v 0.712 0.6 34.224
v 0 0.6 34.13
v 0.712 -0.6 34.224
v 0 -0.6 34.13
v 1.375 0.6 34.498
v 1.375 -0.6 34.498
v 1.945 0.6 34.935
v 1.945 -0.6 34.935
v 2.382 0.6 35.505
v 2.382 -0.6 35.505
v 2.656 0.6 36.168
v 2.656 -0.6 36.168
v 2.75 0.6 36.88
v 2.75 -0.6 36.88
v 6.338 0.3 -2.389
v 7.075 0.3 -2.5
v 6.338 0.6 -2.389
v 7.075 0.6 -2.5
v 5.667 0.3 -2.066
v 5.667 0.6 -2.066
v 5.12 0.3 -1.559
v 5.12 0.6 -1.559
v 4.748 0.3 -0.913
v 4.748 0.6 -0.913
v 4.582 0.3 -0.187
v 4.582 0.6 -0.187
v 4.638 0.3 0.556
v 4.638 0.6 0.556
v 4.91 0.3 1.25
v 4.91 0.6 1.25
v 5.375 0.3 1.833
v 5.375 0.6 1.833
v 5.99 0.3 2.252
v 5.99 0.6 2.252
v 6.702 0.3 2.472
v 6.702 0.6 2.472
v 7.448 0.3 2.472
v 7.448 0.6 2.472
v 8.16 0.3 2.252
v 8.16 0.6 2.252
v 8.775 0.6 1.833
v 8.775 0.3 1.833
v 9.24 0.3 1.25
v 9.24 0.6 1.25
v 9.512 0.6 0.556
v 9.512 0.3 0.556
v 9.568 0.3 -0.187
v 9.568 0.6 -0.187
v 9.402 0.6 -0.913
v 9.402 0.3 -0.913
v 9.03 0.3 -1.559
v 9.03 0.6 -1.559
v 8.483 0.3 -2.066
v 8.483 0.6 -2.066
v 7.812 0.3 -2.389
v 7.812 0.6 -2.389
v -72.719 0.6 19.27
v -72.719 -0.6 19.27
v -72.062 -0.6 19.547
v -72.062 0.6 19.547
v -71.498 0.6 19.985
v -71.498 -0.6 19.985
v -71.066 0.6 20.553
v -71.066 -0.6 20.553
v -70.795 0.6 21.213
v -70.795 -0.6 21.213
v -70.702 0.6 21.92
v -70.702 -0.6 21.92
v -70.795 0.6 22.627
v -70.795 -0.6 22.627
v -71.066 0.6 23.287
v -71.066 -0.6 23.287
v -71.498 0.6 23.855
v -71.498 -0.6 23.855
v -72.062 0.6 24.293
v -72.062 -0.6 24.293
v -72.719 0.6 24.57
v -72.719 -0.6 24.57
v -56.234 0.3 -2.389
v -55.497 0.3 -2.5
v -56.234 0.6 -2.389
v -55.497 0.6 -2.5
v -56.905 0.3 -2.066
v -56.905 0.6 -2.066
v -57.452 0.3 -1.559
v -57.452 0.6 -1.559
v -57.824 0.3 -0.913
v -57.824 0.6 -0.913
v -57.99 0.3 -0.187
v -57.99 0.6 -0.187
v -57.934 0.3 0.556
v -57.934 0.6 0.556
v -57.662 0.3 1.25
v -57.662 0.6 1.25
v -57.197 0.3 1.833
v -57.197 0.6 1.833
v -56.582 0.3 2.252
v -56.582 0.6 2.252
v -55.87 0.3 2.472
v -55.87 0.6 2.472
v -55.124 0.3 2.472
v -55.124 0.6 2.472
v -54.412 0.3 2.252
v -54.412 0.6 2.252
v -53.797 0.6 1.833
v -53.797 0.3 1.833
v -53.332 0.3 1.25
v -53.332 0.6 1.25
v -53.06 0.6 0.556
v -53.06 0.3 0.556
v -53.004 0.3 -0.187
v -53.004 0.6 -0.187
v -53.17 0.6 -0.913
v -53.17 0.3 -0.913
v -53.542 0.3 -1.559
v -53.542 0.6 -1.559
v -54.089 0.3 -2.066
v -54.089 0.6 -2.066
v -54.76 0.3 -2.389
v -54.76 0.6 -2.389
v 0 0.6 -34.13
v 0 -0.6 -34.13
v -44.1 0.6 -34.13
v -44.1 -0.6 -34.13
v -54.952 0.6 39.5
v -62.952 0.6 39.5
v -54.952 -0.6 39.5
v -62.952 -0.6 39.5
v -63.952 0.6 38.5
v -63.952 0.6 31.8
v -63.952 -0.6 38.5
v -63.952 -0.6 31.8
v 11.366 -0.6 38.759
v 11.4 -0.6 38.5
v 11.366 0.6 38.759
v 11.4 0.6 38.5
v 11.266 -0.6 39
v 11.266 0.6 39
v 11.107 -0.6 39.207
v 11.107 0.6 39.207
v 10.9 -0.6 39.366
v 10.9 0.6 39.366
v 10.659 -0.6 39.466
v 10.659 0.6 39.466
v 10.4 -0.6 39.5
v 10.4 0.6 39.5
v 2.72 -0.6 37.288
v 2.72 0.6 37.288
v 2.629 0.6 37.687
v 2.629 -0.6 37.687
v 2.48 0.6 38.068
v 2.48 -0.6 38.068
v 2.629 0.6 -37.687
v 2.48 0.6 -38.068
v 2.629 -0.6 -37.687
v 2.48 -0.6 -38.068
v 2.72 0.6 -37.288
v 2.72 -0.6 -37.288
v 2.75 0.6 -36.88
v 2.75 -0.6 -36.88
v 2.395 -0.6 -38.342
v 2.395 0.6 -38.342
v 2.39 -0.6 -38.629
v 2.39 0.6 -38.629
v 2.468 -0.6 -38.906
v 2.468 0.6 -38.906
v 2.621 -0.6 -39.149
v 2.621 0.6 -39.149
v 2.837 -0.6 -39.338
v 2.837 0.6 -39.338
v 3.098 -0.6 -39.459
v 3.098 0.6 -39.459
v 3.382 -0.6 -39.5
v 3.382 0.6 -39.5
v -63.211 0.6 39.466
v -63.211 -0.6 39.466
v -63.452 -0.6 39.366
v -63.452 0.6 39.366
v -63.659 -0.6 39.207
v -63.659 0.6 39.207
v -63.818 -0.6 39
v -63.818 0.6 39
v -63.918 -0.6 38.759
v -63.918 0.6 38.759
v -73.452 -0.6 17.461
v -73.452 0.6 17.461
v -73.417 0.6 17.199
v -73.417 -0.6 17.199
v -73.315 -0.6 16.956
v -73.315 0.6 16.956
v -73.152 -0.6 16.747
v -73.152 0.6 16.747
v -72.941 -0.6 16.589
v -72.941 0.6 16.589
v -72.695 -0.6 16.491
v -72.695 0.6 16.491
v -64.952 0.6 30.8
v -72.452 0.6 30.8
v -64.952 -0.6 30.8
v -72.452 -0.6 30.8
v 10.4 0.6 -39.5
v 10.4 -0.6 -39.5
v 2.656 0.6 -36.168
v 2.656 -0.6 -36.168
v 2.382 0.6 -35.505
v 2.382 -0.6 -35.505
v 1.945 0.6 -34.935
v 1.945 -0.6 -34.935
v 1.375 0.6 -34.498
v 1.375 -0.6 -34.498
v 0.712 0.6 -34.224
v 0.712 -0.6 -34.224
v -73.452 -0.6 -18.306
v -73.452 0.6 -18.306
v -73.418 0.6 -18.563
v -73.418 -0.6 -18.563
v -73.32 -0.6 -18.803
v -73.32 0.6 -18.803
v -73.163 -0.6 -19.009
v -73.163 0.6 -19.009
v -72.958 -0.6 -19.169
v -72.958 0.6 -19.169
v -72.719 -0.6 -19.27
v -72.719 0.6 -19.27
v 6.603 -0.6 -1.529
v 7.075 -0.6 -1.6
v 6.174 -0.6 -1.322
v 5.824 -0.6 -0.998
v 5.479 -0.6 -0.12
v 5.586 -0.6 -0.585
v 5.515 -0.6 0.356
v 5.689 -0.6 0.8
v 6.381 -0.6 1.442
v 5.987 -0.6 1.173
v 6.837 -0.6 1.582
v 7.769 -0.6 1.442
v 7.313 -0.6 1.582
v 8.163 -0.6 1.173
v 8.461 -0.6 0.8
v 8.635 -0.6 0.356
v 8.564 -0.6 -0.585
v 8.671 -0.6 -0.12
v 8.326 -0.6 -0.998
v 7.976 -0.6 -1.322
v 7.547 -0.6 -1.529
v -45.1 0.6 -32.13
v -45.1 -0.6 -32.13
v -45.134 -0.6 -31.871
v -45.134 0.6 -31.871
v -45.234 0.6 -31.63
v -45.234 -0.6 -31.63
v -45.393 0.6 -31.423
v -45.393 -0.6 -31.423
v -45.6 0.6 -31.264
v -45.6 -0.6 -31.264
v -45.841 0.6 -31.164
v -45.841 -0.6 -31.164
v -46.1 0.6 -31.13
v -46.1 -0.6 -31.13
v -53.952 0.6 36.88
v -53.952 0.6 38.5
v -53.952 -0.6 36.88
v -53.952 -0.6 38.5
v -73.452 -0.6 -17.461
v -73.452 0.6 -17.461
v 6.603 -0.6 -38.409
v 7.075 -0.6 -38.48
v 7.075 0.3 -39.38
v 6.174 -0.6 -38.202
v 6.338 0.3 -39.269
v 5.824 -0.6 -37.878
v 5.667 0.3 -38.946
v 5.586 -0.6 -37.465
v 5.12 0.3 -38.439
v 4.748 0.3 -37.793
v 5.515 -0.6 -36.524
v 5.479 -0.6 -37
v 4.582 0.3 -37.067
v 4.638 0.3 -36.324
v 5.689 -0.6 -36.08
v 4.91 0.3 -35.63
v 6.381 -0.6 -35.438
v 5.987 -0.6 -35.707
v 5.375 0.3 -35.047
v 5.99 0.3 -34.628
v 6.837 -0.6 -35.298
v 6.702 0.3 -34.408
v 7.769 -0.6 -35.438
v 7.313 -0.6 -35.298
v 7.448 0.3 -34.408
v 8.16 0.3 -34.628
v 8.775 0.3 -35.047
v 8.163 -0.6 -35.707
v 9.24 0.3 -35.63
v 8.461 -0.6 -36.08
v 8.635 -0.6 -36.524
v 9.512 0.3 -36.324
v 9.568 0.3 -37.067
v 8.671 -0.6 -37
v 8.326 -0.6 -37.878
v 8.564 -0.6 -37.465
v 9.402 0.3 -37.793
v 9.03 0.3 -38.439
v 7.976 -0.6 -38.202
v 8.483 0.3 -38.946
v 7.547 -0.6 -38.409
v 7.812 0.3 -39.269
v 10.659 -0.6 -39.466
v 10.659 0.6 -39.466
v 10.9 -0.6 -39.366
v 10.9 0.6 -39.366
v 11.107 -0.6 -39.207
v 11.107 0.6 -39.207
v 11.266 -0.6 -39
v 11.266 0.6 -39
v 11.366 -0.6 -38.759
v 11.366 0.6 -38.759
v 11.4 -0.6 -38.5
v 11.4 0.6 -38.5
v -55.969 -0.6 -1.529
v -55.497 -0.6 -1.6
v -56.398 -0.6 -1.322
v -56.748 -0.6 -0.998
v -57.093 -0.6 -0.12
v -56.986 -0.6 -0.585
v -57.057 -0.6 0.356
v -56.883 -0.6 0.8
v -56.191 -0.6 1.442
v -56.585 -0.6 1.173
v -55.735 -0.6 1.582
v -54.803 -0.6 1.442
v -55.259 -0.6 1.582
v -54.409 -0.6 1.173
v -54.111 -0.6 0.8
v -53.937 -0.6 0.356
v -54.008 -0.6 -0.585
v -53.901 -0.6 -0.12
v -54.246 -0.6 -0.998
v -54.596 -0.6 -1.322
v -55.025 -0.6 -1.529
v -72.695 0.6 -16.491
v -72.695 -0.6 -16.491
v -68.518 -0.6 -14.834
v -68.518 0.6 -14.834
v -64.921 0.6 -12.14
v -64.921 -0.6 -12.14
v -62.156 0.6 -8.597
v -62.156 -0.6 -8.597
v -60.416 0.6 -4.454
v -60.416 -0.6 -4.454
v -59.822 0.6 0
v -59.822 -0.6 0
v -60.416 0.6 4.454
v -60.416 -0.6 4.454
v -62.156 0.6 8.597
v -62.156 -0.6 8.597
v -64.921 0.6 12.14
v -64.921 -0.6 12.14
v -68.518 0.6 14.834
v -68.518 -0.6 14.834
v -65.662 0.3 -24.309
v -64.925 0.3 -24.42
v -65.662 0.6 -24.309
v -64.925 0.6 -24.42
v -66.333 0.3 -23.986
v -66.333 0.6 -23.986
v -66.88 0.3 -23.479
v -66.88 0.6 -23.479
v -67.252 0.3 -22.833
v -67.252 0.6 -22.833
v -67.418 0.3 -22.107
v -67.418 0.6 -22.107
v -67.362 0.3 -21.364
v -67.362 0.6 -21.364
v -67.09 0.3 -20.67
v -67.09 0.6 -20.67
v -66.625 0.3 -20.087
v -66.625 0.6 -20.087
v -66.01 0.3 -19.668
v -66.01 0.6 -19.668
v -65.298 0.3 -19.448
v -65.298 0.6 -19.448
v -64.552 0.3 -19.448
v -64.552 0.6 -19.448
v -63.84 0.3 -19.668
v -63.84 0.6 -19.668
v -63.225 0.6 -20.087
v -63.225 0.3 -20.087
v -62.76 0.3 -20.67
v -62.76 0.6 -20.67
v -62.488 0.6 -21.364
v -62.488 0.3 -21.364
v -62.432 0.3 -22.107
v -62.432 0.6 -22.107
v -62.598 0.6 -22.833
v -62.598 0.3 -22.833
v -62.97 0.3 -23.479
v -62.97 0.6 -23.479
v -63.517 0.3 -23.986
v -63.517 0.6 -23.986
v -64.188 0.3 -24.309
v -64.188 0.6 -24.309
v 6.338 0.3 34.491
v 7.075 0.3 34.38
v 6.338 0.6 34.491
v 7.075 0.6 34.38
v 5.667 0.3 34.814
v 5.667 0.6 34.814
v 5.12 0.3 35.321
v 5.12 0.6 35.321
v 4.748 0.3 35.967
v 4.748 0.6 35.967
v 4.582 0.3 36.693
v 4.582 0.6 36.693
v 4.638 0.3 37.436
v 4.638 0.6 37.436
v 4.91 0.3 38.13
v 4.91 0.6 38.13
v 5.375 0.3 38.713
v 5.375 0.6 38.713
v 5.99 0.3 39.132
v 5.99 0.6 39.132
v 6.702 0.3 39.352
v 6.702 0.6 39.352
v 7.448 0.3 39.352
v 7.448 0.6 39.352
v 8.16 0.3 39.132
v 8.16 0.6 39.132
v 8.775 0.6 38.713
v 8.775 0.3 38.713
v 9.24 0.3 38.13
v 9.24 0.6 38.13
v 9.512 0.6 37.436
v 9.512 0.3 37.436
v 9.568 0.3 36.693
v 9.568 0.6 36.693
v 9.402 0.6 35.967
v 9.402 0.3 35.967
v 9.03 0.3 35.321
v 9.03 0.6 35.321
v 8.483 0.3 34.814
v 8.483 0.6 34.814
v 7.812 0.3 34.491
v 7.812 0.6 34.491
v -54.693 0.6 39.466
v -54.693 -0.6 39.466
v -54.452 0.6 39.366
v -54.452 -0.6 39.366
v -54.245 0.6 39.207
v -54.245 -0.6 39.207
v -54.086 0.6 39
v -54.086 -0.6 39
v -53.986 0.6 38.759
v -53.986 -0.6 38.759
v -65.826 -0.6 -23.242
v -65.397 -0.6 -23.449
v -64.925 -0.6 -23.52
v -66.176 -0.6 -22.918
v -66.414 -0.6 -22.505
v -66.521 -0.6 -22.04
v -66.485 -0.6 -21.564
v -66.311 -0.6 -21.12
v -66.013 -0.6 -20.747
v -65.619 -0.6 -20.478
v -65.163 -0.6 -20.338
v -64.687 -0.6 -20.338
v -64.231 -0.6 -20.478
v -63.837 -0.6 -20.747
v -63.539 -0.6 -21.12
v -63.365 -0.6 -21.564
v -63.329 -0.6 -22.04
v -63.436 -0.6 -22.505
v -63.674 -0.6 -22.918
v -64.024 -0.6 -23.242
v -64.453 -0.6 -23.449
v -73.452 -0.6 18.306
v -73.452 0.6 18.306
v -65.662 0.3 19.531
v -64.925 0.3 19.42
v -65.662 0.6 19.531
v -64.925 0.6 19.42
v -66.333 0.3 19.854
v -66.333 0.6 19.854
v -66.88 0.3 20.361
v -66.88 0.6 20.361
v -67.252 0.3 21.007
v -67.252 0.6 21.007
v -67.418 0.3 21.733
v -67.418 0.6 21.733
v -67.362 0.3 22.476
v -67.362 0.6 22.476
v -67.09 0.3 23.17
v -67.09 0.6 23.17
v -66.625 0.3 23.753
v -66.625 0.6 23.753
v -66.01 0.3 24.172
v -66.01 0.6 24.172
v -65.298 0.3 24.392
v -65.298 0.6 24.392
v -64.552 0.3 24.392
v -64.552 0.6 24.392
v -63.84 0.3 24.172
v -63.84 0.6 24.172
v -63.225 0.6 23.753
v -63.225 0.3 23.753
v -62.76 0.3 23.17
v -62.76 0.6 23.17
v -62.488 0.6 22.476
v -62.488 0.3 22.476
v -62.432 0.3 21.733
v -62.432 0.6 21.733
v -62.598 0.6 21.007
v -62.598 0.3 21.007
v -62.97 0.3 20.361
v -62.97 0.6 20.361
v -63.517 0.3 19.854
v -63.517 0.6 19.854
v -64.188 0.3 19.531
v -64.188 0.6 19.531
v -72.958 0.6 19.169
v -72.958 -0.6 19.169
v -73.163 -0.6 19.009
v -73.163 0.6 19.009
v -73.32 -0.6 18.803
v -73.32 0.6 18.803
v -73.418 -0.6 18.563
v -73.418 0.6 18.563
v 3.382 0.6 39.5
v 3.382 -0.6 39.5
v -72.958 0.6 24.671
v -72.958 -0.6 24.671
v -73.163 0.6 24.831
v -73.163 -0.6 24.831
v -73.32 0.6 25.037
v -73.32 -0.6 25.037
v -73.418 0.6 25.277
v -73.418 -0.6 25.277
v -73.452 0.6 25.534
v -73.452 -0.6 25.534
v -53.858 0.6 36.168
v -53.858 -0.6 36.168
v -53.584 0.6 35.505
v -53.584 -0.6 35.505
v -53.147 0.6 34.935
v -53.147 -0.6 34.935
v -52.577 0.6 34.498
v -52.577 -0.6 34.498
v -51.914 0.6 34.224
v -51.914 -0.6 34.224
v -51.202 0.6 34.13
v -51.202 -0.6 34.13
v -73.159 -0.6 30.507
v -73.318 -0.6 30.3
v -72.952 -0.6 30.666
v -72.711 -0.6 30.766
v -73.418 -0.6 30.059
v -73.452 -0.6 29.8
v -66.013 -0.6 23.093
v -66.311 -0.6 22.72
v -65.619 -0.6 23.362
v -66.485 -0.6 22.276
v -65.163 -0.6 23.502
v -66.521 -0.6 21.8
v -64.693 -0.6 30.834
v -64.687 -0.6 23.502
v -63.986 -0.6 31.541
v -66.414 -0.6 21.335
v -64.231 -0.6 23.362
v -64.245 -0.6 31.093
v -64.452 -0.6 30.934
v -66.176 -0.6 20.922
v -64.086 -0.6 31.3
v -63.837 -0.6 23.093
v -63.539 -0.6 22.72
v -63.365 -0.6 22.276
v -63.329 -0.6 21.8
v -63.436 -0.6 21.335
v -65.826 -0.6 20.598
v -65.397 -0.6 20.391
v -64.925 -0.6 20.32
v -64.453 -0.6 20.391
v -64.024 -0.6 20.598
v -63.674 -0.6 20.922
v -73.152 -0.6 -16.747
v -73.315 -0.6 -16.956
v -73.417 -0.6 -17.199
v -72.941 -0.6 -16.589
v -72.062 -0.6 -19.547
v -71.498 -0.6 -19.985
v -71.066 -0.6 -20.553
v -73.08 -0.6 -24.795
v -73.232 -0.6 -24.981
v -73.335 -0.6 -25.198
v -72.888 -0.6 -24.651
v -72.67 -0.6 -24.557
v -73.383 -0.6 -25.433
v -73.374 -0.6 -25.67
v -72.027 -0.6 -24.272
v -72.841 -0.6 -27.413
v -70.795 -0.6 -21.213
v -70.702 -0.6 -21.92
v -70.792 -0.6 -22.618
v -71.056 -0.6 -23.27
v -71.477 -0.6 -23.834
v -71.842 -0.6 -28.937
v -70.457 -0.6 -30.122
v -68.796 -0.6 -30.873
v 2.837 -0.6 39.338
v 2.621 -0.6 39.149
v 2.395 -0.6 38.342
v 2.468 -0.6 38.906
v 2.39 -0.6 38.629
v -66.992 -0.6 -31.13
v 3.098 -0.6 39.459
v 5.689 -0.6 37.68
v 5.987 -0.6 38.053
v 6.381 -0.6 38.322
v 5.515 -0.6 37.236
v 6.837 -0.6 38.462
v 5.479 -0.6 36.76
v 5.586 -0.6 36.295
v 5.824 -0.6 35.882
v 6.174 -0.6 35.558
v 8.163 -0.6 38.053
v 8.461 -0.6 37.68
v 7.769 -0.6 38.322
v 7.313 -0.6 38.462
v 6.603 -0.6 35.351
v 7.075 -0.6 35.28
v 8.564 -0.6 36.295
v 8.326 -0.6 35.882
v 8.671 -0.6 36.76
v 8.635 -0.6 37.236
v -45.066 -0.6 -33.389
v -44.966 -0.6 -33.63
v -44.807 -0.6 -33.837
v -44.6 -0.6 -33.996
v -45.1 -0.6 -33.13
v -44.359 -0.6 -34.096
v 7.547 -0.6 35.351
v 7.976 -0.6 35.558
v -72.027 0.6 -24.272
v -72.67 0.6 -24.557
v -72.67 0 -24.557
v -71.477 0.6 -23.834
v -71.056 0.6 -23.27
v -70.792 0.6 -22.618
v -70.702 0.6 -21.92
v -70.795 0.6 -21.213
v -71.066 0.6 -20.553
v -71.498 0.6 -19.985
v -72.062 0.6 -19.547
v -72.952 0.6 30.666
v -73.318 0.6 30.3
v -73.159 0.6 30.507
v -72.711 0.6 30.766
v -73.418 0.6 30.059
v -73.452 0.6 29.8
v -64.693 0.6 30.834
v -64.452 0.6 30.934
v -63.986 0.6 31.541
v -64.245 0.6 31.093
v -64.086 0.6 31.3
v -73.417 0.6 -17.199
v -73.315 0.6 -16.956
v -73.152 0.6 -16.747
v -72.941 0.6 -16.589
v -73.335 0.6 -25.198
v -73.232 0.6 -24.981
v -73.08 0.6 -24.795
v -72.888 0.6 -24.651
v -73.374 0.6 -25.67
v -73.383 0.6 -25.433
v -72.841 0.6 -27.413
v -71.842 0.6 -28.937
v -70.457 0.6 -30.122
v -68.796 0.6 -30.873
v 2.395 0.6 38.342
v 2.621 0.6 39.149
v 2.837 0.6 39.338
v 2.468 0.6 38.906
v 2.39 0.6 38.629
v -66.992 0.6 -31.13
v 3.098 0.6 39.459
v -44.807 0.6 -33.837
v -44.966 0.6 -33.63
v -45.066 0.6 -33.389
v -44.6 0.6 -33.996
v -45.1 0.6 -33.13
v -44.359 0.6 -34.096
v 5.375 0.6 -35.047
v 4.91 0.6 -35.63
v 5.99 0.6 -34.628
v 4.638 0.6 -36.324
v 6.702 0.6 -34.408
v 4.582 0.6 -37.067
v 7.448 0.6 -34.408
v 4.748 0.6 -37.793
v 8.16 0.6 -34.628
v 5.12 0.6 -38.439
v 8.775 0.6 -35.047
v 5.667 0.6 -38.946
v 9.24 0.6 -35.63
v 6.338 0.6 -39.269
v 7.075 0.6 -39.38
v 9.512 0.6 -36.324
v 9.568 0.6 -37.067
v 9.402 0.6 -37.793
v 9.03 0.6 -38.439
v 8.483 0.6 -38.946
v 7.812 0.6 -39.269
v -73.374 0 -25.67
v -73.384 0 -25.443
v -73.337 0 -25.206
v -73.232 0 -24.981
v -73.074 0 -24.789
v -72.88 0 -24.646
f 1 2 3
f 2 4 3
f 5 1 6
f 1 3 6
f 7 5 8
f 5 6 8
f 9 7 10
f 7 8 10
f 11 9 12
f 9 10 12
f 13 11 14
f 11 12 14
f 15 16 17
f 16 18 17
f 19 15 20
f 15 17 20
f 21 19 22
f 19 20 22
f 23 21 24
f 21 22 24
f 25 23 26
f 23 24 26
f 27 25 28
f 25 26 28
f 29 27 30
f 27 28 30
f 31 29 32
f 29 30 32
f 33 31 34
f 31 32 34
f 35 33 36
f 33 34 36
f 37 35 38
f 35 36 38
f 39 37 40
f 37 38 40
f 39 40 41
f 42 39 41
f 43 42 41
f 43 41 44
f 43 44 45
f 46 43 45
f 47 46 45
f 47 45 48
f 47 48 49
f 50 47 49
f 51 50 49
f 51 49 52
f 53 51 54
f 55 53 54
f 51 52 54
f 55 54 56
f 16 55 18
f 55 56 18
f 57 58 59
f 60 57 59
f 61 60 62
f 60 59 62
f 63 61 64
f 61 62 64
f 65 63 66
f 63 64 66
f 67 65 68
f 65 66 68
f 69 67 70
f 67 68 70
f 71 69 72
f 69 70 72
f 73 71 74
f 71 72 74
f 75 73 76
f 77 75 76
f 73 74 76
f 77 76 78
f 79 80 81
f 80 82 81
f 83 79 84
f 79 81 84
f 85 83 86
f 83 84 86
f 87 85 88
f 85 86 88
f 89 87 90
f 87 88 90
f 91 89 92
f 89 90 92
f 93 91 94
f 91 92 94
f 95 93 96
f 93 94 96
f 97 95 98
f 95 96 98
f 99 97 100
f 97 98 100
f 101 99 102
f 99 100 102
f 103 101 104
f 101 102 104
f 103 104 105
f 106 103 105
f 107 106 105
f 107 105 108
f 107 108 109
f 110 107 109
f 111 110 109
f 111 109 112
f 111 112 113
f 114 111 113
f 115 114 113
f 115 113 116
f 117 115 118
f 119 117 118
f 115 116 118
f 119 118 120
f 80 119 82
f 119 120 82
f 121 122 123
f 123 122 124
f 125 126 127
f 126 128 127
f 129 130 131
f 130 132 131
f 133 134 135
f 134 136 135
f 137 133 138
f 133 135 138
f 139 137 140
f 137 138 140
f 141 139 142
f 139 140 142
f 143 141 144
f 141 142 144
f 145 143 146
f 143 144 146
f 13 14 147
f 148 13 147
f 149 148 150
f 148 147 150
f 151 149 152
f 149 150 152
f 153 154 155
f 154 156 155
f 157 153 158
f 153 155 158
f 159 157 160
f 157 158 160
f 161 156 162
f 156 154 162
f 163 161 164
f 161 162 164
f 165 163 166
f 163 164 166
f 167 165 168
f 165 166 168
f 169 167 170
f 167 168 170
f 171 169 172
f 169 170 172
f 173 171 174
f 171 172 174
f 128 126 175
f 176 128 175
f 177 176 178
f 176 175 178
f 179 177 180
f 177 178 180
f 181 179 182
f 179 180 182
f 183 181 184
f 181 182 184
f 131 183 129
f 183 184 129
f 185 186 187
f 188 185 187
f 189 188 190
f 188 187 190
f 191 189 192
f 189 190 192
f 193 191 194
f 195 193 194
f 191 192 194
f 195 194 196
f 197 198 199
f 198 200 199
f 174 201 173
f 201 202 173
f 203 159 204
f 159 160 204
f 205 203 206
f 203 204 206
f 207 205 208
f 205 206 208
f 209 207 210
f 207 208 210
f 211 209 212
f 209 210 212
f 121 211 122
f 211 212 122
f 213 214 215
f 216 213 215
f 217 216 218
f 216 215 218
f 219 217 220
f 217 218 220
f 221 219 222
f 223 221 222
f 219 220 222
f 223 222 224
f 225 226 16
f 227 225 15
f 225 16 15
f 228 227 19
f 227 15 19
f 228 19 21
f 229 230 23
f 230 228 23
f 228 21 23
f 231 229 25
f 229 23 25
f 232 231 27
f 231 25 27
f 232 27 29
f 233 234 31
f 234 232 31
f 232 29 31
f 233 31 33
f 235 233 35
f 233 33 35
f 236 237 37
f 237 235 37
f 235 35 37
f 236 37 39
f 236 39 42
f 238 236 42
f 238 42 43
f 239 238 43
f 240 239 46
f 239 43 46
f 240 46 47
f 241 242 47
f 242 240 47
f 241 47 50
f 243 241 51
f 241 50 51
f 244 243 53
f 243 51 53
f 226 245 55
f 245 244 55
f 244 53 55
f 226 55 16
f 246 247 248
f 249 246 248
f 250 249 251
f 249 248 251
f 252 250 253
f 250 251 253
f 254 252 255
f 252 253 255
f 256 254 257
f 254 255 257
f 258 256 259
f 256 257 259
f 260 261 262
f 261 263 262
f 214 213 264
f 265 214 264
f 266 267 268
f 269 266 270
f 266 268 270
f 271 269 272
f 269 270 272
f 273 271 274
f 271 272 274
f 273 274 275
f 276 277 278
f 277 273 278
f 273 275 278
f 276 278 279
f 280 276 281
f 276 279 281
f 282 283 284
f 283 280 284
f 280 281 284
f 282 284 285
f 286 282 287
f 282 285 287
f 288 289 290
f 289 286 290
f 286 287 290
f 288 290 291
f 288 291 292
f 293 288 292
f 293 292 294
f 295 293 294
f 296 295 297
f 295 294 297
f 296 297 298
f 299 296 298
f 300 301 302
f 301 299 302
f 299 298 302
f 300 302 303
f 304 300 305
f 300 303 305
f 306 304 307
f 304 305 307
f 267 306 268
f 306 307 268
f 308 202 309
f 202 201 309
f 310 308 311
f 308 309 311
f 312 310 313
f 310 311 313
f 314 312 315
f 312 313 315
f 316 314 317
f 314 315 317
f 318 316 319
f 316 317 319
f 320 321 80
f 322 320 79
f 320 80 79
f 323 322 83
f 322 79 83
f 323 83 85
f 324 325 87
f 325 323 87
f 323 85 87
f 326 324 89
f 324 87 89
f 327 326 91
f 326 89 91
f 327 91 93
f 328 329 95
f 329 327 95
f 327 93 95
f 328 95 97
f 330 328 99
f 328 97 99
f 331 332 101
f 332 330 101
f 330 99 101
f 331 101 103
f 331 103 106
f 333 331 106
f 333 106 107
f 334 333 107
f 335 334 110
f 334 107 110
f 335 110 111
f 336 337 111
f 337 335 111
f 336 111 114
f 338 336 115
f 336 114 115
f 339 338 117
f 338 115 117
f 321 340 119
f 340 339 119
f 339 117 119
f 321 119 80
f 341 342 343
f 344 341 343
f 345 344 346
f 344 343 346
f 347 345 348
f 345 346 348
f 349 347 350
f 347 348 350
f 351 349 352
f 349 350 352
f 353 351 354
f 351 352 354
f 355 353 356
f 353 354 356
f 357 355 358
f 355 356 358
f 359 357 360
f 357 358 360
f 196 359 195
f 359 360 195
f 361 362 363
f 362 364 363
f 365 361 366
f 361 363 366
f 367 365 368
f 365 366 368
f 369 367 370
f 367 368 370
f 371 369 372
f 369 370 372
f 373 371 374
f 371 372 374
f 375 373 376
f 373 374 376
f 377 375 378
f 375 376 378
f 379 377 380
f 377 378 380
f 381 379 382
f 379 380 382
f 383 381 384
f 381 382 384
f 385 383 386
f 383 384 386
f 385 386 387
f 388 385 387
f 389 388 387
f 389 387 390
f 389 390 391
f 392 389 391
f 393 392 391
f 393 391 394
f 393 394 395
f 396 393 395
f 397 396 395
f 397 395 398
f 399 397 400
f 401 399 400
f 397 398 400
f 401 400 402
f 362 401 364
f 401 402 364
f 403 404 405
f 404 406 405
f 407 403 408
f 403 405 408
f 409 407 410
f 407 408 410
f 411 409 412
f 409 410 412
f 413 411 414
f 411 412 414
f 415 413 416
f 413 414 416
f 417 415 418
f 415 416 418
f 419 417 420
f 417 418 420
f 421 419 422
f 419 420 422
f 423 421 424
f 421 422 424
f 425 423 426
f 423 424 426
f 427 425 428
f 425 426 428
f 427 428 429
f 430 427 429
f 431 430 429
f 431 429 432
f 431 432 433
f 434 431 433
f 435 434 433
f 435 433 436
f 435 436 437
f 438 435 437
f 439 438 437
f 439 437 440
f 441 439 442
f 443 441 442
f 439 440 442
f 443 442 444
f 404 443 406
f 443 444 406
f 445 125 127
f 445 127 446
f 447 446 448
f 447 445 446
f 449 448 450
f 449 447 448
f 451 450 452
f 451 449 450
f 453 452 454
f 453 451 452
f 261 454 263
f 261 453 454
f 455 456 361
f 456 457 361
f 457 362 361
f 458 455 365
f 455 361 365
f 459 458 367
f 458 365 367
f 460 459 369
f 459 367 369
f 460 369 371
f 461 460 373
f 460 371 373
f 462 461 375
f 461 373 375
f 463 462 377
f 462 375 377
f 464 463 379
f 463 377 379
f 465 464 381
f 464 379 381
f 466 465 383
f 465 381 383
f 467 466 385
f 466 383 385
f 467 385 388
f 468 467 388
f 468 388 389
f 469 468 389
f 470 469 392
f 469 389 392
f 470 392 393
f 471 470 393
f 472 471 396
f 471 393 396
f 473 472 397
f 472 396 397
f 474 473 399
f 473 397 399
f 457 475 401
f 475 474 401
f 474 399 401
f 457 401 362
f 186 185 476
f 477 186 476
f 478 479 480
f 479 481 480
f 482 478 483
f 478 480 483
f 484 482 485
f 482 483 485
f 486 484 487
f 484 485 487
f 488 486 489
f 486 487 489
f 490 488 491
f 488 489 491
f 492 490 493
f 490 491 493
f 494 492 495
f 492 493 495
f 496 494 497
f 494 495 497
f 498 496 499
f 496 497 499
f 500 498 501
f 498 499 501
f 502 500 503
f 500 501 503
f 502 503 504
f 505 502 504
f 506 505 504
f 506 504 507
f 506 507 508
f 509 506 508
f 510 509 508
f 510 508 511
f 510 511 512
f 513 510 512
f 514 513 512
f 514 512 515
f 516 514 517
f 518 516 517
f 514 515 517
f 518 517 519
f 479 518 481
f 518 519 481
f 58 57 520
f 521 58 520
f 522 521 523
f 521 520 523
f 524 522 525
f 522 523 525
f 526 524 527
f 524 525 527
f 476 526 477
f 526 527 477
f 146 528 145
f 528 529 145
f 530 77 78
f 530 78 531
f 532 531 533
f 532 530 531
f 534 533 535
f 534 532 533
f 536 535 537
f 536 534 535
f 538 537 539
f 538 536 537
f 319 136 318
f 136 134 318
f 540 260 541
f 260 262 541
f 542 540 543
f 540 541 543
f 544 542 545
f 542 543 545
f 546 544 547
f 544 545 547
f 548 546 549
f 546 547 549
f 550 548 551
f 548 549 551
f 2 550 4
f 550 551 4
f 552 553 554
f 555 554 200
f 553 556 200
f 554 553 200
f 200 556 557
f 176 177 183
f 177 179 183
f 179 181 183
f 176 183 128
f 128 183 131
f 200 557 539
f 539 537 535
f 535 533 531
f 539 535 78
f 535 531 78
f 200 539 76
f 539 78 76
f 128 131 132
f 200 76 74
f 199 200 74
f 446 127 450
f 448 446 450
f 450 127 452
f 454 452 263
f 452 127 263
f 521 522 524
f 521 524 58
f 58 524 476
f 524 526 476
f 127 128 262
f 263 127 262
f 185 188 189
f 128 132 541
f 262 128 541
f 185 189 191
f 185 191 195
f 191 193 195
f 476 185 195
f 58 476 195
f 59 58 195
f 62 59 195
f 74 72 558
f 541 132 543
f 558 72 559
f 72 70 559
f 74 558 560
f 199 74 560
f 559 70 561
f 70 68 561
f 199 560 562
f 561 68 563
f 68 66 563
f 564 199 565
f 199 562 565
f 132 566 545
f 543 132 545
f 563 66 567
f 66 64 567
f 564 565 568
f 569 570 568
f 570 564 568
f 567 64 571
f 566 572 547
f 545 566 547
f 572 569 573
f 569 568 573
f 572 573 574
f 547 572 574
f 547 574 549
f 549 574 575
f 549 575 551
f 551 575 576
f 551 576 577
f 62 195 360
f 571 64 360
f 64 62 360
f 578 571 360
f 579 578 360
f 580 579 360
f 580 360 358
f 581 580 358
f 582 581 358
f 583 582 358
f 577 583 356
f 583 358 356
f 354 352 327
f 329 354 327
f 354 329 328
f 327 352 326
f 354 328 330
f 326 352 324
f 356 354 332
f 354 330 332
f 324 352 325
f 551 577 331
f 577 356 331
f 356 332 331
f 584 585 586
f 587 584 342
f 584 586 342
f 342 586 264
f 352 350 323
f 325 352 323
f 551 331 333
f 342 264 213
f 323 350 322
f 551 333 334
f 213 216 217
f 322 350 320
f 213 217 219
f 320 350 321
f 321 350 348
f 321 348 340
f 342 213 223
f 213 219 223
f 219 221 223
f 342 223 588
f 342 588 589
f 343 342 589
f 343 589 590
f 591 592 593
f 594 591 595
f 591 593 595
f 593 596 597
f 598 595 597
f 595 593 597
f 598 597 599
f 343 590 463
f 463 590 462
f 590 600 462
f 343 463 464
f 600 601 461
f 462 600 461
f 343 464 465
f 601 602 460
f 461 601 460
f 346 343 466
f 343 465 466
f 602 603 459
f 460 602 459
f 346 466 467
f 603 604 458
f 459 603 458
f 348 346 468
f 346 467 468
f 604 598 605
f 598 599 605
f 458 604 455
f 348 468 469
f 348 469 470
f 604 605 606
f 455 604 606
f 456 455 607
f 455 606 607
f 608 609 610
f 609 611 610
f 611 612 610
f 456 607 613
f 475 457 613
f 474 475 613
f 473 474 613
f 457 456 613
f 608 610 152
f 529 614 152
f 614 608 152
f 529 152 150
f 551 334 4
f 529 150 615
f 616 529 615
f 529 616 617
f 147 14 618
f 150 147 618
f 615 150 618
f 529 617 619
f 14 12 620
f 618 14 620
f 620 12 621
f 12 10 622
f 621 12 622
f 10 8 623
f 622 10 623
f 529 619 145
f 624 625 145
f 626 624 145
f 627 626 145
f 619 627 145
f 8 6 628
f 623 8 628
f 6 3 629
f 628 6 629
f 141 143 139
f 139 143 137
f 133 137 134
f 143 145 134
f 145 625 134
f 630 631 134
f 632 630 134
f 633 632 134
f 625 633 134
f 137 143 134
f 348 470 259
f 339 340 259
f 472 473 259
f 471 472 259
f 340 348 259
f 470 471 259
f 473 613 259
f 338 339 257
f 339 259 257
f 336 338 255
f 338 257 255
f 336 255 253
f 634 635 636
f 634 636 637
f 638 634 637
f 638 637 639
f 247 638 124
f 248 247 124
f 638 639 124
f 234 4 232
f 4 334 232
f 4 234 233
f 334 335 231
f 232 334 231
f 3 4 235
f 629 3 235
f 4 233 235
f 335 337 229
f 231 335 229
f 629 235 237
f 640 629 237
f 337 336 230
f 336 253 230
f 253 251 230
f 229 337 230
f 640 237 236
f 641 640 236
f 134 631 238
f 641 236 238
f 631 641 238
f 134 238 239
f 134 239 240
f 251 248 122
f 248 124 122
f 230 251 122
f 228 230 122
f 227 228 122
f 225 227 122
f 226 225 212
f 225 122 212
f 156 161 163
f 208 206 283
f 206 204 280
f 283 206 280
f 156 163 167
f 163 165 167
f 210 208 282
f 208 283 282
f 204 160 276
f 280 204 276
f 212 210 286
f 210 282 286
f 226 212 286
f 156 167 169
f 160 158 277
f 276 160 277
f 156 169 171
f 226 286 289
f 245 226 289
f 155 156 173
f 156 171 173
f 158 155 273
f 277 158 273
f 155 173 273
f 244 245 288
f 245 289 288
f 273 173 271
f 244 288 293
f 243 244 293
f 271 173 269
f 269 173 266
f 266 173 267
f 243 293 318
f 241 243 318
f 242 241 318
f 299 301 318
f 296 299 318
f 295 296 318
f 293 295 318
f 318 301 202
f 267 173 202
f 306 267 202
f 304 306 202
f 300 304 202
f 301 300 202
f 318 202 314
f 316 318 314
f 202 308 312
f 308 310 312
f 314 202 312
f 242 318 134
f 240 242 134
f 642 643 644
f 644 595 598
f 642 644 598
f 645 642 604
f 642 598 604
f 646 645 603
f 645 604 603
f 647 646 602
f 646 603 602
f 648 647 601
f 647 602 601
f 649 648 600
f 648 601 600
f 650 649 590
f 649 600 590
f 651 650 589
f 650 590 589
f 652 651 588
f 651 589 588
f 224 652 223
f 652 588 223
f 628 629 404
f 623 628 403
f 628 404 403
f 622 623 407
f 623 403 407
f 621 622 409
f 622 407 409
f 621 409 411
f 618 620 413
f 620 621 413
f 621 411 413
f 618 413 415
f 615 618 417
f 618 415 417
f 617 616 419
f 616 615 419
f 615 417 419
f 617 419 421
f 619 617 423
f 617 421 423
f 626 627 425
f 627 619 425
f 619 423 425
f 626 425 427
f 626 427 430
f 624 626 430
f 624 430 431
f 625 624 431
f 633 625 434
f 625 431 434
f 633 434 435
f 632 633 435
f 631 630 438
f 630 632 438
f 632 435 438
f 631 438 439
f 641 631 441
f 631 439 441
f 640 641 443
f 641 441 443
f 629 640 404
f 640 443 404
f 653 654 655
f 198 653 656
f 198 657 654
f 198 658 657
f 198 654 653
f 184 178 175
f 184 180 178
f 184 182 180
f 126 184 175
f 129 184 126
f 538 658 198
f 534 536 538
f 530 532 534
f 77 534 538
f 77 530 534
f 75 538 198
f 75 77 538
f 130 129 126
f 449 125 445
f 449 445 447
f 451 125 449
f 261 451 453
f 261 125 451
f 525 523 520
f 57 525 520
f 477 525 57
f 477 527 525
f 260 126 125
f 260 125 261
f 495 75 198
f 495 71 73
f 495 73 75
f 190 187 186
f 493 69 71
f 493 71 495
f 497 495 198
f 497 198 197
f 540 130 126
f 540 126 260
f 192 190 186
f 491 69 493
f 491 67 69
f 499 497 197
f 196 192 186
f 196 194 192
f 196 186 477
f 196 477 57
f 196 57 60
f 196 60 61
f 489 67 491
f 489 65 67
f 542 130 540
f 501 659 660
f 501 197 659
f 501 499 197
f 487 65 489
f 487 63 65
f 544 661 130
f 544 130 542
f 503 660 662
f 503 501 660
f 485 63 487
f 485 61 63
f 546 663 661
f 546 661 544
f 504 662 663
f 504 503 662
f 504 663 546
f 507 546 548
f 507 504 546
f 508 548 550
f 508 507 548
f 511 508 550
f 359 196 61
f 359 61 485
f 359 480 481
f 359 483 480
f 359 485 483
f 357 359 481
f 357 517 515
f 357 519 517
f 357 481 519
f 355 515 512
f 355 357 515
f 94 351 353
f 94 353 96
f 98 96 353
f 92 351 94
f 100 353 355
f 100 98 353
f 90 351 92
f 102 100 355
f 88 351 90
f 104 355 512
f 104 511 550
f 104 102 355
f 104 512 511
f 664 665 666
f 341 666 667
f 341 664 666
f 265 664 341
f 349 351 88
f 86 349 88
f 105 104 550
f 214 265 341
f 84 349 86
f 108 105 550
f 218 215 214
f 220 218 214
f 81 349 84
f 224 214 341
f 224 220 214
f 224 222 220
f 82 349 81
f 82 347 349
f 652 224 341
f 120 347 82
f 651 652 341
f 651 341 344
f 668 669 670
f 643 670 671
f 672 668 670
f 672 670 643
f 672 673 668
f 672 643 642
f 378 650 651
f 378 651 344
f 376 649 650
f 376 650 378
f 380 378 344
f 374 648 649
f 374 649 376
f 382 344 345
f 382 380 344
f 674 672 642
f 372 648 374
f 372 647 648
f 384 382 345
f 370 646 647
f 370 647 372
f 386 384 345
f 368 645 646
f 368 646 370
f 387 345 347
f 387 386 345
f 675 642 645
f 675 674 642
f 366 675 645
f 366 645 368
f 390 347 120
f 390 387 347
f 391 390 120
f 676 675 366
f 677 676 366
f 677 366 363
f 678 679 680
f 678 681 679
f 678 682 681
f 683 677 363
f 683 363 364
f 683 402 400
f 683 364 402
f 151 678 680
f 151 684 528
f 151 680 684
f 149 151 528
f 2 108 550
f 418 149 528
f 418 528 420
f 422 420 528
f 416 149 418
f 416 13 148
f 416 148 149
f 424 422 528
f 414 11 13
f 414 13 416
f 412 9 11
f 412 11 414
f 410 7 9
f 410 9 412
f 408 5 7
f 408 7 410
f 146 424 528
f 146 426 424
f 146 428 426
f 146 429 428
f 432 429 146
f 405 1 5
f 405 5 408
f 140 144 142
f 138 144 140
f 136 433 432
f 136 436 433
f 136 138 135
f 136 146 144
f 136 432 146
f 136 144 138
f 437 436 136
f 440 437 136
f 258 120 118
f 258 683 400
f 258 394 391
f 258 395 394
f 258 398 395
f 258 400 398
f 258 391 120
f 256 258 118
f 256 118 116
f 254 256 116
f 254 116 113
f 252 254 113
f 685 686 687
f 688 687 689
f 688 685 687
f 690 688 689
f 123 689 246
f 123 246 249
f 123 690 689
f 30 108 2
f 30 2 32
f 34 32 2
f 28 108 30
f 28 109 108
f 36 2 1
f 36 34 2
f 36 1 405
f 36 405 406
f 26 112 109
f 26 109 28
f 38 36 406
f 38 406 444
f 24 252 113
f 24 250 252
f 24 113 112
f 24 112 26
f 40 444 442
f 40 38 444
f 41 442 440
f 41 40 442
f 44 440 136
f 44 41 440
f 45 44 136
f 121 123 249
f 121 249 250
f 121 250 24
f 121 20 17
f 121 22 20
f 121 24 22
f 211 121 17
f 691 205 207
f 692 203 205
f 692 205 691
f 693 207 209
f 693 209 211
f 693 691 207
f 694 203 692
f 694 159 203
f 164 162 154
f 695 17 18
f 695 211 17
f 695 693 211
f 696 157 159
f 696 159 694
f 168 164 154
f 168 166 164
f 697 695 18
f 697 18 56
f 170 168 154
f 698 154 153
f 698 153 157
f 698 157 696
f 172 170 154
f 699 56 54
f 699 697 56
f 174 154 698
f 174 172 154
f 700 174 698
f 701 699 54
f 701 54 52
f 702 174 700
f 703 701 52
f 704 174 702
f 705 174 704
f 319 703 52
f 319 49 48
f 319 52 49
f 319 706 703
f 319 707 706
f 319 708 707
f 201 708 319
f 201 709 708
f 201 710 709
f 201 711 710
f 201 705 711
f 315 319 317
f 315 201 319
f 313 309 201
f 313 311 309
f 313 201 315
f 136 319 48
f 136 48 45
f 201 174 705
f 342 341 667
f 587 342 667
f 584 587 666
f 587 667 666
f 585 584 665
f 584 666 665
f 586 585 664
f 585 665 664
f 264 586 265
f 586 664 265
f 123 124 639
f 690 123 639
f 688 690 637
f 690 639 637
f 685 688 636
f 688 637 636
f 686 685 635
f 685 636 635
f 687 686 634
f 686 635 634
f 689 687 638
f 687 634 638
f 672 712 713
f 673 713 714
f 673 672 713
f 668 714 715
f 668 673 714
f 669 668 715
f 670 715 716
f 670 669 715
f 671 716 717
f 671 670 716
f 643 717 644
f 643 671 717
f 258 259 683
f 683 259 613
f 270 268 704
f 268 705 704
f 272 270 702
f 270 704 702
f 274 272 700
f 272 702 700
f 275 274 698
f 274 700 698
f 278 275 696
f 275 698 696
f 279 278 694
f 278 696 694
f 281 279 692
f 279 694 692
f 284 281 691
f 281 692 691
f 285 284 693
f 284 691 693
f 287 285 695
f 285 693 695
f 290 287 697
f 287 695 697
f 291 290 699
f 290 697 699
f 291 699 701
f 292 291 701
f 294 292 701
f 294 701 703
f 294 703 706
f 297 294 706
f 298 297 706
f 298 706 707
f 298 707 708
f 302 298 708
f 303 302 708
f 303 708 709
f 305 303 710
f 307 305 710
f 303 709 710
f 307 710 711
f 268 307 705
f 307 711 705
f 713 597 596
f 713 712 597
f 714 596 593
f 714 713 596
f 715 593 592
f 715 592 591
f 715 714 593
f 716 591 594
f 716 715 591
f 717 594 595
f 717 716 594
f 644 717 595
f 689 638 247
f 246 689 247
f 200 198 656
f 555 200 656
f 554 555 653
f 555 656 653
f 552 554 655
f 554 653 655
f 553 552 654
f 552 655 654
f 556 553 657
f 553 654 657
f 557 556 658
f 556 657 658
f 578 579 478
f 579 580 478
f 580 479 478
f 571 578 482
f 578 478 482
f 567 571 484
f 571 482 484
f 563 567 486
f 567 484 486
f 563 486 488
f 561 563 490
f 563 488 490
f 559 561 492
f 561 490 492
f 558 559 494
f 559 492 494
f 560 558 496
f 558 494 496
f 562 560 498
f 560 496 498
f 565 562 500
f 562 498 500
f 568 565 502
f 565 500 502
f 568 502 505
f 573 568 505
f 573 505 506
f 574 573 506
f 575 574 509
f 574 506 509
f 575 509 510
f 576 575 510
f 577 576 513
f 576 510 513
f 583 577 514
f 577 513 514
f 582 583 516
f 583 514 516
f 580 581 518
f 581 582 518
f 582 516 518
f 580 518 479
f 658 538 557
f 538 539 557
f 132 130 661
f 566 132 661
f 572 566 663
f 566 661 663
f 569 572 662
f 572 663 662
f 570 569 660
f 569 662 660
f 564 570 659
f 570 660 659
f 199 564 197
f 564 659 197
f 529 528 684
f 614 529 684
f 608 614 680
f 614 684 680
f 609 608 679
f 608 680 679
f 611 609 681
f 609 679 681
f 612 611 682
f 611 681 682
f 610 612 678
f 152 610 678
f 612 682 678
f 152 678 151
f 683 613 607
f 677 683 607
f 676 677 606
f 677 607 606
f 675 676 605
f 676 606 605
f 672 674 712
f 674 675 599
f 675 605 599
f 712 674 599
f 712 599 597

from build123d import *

# Parameters (mm, degrees)
SKETCH1_R                    = 1
BASE_SHAPE_DEPTH             = 0.6
FILLETS_R                    = 1
M2_5_COUNTERSUNKS_AT_2_COUNT = 2
M2_5_COUNTERSUNKS_AT_2_PITCH = 73.76
M2_5_COUNTERSUNKS_AT_3_COUNT = 2
M2_5_COUNTERSUNKS_AT_3_PITCH = 73.537756289
M2_5_COUNTERSUNKS_AT_4_COUNT = 2
M2_5_COUNTERSUNKS_AT_4_PITCH = 92.959345953
M2_5_COUNTERSUNKS_AT_5_COUNT = 2
M2_5_COUNTERSUNKS_AT_5_PITCH = 36.88
M2_5_COUNTERSUNKS_AT_6_COUNT = 2
M2_5_COUNTERSUNKS_AT_6_PITCH = 72.631898864


with BuildPart() as part:
    # Sketch1 → Base shape (new body, symmetric)
    with BuildSketch(Plane(origin=(0, 0, 0), x_dir=(1, 0, 0), z_dir=(0, 1, 0))):
        with BuildLine():
            ThreePointArc((2.75, 36.88), (1.944543648, 34.935456352), (0, 34.13))
            Line((0, 34.13), (-44.1, 34.13))
            ThreePointArc((-44.1, 34.13), (-44.807106781, 33.837106781), (-45.1, 33.13))
            Line((-45.1, 33.13), (-45.1, 32.13))
            ThreePointArc((-45.1, 32.13), (-45.392893219, 31.422893219), (-46.1, 31.13))
            Line((-46.1, 31.13), (-66.992025159, 31.13))
            ThreePointArc((-66.992025159, 31.13), (-71.559934966, 29.237909806), (-73.452025159, 24.67))
            ThreePointArc((-73.452025159, 24.67), (-71.507481511, 23.864543648), (-70.702025159, 21.92))
            ThreePointArc((-70.702025159, 21.92), (-71.507481511, 19.975456352), (-73.452025159, 19.17))
            Line((-73.452025159, 19.17), (-73.452025159, 16.662625843))
            ThreePointArc((-73.452025159, 16.662625843), (-63.663567803, 10.763596053), (-59.822025159, 0))
            ThreePointArc((-59.822025159, 0), (-63.663567803, -10.763596053), (-73.452025159, -16.662625843))
            Line((-73.452025159, -16.662625843), (-73.452025159, -19.17))
            ThreePointArc((-73.452025159, -19.17), (-71.507481511, -19.975456352), (-70.702025159, -21.92))
            ThreePointArc((-70.702025159, -21.92), (-71.507481511, -23.864543648), (-73.452025159, -24.67))
            Line((-73.452025159, -24.67), (-73.452025159, -30.8))
            Line((-73.452025159, -30.8), (-63.952025159, -30.8))
            Line((-63.952025159, -30.8), (-63.952025159, -34.13))
            Line((-63.952025159, -34.13), (-63.952025159, -39.5))
            Line((-63.952025159, -39.5), (-53.952025159, -39.5))
            Line((-53.952025159, -39.5), (-53.952025159, -36.88))
            ThreePointArc((-53.952025159, -36.88), (-53.146568808, -34.935456352), (-51.202025159, -34.13))
            Line((-51.202025159, -34.13), (0, -34.13))
            ThreePointArc((0, -34.13), (1.944543648, -34.935456352), (2.75, -36.88))
            ThreePointArc((2.75, -36.88), (2.220381771, -38.502468734), (0.835523788, -39.5))
            Line((0.835523788, -39.5), (11.4, -39.5))
            Line((11.4, -39.5), (11.4, 39.5))
            Line((11.4, 39.5), (0.835523788, 39.5))
            ThreePointArc((0.835523788, 39.5), (2.220381771, 38.502468734), (2.75, 36.88))
        make_face()
        with Locations((-64.925, -21.92)):
            Circle(SKETCH1_R, mode=Mode.SUBTRACT)
        with Locations((7.075, -36.88)):
            Circle(SKETCH1_R, mode=Mode.SUBTRACT)
        with Locations((-55.497025159, 0)):
            Circle(SKETCH1_R, mode=Mode.SUBTRACT)
        with Locations((-64.925, 21.92)):
            Circle(SKETCH1_R, mode=Mode.SUBTRACT)
        with Locations((7.075, 0)):
            Circle(SKETCH1_R, mode=Mode.SUBTRACT)
        with Locations((7.075, 36.88)):
            Circle(SKETCH1_R, mode=Mode.SUBTRACT)
    extrude(amount=BASE_SHAPE_DEPTH, both=True)

    # Fillets
    fillets_edges = [part.edges().sort_by_distance(p)[0] for p in [
        (0.835523788, -0.3, -39.5),
        (11.4, -0.3, -39.5),
        (11.4, -0.3, 39.5),
        (0.835523788, -0.3, 39.5),
        (-53.952025159, -0.3, 39.5),
        (-63.952025159, -0.3, 39.5),
        (-63.952025159, -0.3, 30.8),
        (-73.452025159, -0.3, 30.8),
        (-73.452025159, -0.3, 24.67),
        (-73.452025159, -0.3, 19.17),
        (-73.452025159, -0.3, 16.662625843),
        (-73.452025159, -0.3, -16.662625843),
        (-73.452025159, -0.3, -19.17),
        (-73.452025159, -0.3, -24.67),
    ]]
    fillet(fillets_edges, radius=FILLETS_R)

    # Sketch3 → M2.5 countersunks (revolve, cut)
    with BuildSketch(Plane(origin=(7.075, -0.6, -36.88), x_dir=(0, 0, -1), z_dir=(1, 0, 0))):
        Polygon((0, 0), (0, 1.2), (1.25, 1.2), (1.25, 1.55), (2.5, 0.3), (2.5, 0), align=None)
    m2_5_countersunks = revolve(axis=Axis((7.075, -6.95, -36.88), (0, 1, 0)), mode=Mode.SUBTRACT)

    # M2.5 countersunks at 2: M2.5 countersunks ×2
    with Locations(*[(0, 0, i * M2_5_COUNTERSUNKS_AT_2_PITCH) for i in range(1, M2_5_COUNTERSUNKS_AT_2_COUNT)]):
        add(m2_5_countersunks, mode=Mode.SUBTRACT)

    # M2.5 countersunks at 3: M2.5 countersunks ×2
    with Locations(*[Vector(-0.979088888, 0, 0.203432913) * (i * M2_5_COUNTERSUNKS_AT_3_PITCH) for i in range(1, M2_5_COUNTERSUNKS_AT_3_COUNT)]):
        add(m2_5_countersunks, mode=Mode.SUBTRACT)

    # M2.5 countersunks at 4: M2.5 countersunks ×2
    with Locations(*[Vector(-0.774532128, 0, 0.632534571) * (i * M2_5_COUNTERSUNKS_AT_4_PITCH) for i in range(1, M2_5_COUNTERSUNKS_AT_4_COUNT)]):
        add(m2_5_countersunks, mode=Mode.SUBTRACT)

    # M2.5 countersunks at 5: M2.5 countersunks ×2
    with Locations(*[(0, 0, i * M2_5_COUNTERSUNKS_AT_5_PITCH) for i in range(1, M2_5_COUNTERSUNKS_AT_5_COUNT)]):
        add(m2_5_countersunks, mode=Mode.SUBTRACT)

    # M2.5 countersunks at 6: M2.5 countersunks ×2
    with Locations(*[Vector(-0.861495103, 0, 0.507765879) * (i * M2_5_COUNTERSUNKS_AT_6_PITCH) for i in range(1, M2_5_COUNTERSUNKS_AT_6_COUNT)]):
        add(m2_5_countersunks, mode=Mode.SUBTRACT)


with BuildPart() as body_2:
    # Mirror1: mirrored copy
    add(part.part.mirror(Plane.ZX))


solid = body_2.part
